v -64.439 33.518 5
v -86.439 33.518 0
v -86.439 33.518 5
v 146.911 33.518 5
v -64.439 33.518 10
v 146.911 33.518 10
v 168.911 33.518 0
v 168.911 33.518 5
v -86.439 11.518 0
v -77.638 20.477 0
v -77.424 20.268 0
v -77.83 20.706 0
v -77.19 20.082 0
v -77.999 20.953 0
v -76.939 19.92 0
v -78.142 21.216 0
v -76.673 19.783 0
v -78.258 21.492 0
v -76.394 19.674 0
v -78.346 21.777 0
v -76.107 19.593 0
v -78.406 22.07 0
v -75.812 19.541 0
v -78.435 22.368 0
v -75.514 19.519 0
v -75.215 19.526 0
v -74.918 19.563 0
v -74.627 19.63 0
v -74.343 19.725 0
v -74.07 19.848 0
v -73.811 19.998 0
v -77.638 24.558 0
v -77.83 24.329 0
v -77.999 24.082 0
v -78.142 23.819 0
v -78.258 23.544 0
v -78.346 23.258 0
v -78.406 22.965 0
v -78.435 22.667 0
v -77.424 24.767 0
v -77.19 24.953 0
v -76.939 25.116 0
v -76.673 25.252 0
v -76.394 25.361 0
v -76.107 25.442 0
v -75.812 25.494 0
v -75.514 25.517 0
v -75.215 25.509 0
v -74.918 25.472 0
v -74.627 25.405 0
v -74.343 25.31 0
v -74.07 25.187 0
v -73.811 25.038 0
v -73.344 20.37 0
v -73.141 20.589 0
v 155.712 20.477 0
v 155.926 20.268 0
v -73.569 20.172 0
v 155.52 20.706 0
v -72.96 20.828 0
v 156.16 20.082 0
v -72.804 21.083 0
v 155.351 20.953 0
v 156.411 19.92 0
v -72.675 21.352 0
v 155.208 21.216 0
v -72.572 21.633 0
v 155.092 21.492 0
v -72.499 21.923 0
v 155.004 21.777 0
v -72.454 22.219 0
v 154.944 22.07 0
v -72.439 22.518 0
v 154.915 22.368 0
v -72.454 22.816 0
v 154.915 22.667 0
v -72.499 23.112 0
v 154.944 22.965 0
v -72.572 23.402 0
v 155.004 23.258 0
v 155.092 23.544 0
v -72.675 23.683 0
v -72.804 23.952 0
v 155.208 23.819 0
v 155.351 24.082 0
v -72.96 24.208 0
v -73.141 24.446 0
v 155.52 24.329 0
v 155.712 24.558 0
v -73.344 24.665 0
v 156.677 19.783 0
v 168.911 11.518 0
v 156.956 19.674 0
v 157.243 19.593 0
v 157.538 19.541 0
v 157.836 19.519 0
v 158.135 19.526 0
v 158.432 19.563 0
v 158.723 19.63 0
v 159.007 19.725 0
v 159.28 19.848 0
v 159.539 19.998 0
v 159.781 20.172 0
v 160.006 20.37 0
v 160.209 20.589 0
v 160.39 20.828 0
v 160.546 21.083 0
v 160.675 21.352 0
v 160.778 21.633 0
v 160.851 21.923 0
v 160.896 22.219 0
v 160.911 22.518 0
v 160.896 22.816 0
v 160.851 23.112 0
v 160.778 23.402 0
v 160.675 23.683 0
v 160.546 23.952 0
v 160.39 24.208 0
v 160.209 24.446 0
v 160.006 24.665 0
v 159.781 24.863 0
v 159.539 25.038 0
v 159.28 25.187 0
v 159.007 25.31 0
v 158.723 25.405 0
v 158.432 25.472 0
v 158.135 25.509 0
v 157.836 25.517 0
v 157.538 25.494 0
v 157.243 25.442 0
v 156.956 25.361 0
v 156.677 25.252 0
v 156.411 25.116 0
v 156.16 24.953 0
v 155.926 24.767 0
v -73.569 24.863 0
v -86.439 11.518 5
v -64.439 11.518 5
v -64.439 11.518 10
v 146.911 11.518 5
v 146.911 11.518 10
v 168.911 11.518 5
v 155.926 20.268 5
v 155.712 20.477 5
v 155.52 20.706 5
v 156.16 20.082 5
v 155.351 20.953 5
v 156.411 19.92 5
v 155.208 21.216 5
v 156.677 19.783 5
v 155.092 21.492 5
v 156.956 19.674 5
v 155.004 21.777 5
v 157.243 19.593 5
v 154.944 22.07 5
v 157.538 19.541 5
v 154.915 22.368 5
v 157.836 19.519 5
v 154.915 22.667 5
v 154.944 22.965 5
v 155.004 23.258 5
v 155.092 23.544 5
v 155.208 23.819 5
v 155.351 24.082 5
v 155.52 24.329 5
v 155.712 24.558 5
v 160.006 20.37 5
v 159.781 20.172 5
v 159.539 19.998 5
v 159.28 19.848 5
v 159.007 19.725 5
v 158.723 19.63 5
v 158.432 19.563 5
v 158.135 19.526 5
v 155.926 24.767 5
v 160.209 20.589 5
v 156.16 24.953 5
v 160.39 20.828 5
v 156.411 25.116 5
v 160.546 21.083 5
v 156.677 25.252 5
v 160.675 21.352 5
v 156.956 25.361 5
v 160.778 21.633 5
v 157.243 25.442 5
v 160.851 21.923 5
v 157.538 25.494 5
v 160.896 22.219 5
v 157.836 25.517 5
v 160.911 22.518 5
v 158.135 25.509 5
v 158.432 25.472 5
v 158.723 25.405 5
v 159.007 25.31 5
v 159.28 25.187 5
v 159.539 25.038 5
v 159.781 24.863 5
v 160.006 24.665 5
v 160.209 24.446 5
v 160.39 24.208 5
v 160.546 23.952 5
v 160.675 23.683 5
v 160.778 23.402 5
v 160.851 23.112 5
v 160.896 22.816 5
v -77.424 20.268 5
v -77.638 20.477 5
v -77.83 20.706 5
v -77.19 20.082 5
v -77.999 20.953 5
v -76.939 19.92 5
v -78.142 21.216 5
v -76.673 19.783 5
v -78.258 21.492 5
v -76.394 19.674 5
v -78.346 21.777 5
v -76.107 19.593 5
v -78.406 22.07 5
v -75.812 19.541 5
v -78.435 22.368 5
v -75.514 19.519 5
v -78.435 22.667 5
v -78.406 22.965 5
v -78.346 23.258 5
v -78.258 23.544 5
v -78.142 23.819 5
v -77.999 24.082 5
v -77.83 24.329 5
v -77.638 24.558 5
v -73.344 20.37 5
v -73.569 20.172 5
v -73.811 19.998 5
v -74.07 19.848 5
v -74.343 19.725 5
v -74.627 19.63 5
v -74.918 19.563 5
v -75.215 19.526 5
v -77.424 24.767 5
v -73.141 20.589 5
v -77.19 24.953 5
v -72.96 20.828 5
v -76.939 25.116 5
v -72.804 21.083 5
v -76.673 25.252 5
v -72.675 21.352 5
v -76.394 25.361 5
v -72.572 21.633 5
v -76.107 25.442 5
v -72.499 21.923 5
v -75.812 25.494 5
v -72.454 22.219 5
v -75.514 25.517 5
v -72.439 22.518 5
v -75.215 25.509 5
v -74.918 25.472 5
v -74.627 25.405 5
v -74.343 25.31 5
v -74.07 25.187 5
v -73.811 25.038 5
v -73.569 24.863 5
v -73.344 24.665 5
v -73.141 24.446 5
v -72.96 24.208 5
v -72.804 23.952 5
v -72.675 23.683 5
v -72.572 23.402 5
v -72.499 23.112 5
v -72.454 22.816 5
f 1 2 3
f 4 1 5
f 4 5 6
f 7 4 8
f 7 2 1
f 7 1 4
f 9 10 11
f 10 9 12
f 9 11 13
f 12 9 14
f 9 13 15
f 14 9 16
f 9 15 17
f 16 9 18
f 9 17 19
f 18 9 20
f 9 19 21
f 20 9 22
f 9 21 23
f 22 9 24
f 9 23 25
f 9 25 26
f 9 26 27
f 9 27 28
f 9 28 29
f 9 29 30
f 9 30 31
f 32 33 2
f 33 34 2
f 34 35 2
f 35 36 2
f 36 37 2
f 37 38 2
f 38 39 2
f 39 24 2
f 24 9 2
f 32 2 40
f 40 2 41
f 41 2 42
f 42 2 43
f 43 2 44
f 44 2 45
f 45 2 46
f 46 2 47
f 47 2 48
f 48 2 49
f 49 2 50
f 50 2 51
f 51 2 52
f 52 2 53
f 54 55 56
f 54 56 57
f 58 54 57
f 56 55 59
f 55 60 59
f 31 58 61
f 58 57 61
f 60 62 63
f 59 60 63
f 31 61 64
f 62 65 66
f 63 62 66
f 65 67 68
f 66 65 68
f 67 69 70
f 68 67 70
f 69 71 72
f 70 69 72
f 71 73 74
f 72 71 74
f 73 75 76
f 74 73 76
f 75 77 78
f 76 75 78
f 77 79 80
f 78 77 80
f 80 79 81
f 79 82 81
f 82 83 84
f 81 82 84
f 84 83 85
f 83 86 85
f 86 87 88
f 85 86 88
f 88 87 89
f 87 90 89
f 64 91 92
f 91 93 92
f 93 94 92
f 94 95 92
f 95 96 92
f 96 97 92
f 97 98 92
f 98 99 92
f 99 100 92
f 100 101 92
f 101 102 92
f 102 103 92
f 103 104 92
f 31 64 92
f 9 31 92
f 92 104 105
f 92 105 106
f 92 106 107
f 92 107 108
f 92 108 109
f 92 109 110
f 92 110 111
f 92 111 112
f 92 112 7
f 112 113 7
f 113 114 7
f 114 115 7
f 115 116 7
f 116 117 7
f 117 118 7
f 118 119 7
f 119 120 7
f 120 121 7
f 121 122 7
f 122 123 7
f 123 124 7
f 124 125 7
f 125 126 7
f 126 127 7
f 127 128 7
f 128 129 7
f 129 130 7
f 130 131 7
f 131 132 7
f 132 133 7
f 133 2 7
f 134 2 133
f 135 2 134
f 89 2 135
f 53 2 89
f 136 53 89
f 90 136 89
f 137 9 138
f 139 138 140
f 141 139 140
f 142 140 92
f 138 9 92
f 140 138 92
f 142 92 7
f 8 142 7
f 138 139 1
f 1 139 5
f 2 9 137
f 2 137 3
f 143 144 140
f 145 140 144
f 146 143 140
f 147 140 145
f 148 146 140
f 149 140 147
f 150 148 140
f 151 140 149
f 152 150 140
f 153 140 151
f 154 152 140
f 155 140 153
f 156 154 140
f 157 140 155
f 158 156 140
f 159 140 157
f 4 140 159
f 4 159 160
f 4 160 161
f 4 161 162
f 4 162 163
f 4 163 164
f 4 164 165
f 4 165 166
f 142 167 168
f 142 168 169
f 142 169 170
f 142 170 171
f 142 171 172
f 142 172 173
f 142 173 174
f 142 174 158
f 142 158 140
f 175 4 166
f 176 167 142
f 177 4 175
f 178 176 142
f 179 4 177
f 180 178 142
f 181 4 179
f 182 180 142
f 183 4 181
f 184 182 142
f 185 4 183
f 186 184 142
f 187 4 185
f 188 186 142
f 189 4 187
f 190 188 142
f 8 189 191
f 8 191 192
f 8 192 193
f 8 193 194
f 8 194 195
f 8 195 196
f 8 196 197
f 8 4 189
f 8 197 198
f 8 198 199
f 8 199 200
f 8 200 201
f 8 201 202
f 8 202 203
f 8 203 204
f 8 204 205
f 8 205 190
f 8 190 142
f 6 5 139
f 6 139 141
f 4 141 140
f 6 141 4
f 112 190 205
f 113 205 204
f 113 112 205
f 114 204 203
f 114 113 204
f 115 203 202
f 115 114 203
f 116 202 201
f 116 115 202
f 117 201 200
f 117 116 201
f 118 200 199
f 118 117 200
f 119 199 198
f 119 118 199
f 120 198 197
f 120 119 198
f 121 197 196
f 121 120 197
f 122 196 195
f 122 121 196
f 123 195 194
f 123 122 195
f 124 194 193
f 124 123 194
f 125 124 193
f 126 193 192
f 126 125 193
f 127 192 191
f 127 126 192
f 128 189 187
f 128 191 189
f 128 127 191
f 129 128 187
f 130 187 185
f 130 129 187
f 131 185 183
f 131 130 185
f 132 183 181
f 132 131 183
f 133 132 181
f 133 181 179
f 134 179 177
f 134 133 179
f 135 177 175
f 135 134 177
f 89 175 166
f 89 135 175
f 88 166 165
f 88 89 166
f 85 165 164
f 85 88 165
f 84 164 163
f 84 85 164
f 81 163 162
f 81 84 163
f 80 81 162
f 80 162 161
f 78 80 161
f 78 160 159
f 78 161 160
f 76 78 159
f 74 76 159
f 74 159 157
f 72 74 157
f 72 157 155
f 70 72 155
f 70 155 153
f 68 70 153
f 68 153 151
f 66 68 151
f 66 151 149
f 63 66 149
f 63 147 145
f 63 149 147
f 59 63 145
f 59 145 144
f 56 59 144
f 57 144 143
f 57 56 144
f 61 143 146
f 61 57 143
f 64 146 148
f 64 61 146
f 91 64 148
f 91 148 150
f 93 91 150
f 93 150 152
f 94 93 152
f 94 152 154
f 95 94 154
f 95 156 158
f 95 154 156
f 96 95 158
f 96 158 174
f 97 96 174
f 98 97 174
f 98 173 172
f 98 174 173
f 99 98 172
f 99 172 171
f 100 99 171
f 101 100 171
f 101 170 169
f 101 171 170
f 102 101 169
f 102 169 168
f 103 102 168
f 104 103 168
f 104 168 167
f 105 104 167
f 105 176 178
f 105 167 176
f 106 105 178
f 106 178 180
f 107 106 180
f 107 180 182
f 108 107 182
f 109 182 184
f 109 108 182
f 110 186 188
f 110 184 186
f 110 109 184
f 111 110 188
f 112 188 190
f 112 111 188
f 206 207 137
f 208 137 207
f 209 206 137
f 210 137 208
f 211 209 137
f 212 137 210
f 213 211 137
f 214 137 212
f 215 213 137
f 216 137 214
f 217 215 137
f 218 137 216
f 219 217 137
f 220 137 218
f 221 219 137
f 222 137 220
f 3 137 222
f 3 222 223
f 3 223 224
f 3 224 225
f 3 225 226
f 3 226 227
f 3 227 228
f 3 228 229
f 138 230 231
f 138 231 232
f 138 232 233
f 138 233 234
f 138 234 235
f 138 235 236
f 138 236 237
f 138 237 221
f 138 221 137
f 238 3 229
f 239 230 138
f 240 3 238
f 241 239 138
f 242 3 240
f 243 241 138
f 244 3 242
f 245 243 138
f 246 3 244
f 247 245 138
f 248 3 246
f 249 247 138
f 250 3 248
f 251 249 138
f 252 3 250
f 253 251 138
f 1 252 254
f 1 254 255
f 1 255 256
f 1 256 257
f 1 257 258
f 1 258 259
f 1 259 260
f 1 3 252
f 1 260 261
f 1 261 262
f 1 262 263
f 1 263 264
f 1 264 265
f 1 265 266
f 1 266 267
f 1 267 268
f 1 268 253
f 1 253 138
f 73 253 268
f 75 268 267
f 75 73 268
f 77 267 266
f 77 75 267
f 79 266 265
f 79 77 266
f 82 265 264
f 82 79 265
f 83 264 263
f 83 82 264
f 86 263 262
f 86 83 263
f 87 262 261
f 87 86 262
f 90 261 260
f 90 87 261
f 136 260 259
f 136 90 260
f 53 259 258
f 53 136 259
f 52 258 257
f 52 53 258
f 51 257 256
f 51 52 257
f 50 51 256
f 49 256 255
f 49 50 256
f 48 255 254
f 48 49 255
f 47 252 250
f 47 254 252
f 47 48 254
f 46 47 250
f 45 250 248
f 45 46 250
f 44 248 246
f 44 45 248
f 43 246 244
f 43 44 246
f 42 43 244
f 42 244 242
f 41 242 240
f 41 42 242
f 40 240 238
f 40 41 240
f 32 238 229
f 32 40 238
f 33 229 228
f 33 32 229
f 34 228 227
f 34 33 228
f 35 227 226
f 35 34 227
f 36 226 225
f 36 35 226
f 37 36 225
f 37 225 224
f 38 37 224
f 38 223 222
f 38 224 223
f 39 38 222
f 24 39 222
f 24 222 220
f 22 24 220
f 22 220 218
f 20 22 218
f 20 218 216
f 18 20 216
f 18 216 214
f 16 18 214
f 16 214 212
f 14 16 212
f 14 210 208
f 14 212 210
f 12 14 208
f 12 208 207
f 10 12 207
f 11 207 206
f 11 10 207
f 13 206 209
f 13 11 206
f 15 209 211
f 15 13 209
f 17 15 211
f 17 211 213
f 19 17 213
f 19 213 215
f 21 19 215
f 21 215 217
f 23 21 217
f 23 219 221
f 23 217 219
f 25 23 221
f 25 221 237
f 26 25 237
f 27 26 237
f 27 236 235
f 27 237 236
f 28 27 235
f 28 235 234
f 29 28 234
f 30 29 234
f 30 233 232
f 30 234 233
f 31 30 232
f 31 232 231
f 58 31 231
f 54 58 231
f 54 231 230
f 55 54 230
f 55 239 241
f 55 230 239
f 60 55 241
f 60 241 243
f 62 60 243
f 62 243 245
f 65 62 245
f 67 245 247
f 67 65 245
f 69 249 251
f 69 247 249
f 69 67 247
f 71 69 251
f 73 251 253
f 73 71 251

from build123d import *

# Parameters (mm, degrees)
ESQUISSE5_W             = 255.35
ESQUISSE5_H             = 22
BOSS_EXTRU_1_DEPTH      = 10
ESQUISSE6_R             = 3
ENL_V_MAT_EXTRU_4_DEPTH = 173.494473459
ESQUISSE7_W             = 22
ESQUISSE7_H             = 22
ENL_V_MAT_EXTRU_5_DEPTH = 5


with BuildPart() as part:
    # Esquisse5 → Boss.-Extru.1 (new body)
    with BuildSketch(Plane.XY):
        with Locations((41.235968465, 22.517579062)):
            Rectangle(ESQUISSE5_W, ESQUISSE5_H)
    extrude(amount=BOSS_EXTRU_1_DEPTH)

    # Esquisse6 → Enlèv. mat.-Extru.4 (cut, through all)
    with BuildSketch(Plane.XY):
        with Locations((-75.439031535, 22.517579062)):
            Circle(ESQUISSE6_R)
        with Locations((157.910968465, 22.517579062)):
            Circle(ESQUISSE6_R)
    extrude(amount=ENL_V_MAT_EXTRU_4_DEPTH, mode=Mode.SUBTRACT)

    # Esquisse7 → Enlèv. mat.-Extru.5 (cut)
    with BuildSketch(Plane.XY.offset(10)):
        with Locations((-75.439031535, 22.517579062)):
            Rectangle(ESQUISSE7_W, ESQUISSE7_H)
        with Locations((157.910968465, 22.517579062)):
            Rectangle(ESQUISSE7_W, ESQUISSE7_H)
    extrude(amount=-ENL_V_MAT_EXTRU_5_DEPTH, mode=Mode.SUBTRACT)


solid = part.part
